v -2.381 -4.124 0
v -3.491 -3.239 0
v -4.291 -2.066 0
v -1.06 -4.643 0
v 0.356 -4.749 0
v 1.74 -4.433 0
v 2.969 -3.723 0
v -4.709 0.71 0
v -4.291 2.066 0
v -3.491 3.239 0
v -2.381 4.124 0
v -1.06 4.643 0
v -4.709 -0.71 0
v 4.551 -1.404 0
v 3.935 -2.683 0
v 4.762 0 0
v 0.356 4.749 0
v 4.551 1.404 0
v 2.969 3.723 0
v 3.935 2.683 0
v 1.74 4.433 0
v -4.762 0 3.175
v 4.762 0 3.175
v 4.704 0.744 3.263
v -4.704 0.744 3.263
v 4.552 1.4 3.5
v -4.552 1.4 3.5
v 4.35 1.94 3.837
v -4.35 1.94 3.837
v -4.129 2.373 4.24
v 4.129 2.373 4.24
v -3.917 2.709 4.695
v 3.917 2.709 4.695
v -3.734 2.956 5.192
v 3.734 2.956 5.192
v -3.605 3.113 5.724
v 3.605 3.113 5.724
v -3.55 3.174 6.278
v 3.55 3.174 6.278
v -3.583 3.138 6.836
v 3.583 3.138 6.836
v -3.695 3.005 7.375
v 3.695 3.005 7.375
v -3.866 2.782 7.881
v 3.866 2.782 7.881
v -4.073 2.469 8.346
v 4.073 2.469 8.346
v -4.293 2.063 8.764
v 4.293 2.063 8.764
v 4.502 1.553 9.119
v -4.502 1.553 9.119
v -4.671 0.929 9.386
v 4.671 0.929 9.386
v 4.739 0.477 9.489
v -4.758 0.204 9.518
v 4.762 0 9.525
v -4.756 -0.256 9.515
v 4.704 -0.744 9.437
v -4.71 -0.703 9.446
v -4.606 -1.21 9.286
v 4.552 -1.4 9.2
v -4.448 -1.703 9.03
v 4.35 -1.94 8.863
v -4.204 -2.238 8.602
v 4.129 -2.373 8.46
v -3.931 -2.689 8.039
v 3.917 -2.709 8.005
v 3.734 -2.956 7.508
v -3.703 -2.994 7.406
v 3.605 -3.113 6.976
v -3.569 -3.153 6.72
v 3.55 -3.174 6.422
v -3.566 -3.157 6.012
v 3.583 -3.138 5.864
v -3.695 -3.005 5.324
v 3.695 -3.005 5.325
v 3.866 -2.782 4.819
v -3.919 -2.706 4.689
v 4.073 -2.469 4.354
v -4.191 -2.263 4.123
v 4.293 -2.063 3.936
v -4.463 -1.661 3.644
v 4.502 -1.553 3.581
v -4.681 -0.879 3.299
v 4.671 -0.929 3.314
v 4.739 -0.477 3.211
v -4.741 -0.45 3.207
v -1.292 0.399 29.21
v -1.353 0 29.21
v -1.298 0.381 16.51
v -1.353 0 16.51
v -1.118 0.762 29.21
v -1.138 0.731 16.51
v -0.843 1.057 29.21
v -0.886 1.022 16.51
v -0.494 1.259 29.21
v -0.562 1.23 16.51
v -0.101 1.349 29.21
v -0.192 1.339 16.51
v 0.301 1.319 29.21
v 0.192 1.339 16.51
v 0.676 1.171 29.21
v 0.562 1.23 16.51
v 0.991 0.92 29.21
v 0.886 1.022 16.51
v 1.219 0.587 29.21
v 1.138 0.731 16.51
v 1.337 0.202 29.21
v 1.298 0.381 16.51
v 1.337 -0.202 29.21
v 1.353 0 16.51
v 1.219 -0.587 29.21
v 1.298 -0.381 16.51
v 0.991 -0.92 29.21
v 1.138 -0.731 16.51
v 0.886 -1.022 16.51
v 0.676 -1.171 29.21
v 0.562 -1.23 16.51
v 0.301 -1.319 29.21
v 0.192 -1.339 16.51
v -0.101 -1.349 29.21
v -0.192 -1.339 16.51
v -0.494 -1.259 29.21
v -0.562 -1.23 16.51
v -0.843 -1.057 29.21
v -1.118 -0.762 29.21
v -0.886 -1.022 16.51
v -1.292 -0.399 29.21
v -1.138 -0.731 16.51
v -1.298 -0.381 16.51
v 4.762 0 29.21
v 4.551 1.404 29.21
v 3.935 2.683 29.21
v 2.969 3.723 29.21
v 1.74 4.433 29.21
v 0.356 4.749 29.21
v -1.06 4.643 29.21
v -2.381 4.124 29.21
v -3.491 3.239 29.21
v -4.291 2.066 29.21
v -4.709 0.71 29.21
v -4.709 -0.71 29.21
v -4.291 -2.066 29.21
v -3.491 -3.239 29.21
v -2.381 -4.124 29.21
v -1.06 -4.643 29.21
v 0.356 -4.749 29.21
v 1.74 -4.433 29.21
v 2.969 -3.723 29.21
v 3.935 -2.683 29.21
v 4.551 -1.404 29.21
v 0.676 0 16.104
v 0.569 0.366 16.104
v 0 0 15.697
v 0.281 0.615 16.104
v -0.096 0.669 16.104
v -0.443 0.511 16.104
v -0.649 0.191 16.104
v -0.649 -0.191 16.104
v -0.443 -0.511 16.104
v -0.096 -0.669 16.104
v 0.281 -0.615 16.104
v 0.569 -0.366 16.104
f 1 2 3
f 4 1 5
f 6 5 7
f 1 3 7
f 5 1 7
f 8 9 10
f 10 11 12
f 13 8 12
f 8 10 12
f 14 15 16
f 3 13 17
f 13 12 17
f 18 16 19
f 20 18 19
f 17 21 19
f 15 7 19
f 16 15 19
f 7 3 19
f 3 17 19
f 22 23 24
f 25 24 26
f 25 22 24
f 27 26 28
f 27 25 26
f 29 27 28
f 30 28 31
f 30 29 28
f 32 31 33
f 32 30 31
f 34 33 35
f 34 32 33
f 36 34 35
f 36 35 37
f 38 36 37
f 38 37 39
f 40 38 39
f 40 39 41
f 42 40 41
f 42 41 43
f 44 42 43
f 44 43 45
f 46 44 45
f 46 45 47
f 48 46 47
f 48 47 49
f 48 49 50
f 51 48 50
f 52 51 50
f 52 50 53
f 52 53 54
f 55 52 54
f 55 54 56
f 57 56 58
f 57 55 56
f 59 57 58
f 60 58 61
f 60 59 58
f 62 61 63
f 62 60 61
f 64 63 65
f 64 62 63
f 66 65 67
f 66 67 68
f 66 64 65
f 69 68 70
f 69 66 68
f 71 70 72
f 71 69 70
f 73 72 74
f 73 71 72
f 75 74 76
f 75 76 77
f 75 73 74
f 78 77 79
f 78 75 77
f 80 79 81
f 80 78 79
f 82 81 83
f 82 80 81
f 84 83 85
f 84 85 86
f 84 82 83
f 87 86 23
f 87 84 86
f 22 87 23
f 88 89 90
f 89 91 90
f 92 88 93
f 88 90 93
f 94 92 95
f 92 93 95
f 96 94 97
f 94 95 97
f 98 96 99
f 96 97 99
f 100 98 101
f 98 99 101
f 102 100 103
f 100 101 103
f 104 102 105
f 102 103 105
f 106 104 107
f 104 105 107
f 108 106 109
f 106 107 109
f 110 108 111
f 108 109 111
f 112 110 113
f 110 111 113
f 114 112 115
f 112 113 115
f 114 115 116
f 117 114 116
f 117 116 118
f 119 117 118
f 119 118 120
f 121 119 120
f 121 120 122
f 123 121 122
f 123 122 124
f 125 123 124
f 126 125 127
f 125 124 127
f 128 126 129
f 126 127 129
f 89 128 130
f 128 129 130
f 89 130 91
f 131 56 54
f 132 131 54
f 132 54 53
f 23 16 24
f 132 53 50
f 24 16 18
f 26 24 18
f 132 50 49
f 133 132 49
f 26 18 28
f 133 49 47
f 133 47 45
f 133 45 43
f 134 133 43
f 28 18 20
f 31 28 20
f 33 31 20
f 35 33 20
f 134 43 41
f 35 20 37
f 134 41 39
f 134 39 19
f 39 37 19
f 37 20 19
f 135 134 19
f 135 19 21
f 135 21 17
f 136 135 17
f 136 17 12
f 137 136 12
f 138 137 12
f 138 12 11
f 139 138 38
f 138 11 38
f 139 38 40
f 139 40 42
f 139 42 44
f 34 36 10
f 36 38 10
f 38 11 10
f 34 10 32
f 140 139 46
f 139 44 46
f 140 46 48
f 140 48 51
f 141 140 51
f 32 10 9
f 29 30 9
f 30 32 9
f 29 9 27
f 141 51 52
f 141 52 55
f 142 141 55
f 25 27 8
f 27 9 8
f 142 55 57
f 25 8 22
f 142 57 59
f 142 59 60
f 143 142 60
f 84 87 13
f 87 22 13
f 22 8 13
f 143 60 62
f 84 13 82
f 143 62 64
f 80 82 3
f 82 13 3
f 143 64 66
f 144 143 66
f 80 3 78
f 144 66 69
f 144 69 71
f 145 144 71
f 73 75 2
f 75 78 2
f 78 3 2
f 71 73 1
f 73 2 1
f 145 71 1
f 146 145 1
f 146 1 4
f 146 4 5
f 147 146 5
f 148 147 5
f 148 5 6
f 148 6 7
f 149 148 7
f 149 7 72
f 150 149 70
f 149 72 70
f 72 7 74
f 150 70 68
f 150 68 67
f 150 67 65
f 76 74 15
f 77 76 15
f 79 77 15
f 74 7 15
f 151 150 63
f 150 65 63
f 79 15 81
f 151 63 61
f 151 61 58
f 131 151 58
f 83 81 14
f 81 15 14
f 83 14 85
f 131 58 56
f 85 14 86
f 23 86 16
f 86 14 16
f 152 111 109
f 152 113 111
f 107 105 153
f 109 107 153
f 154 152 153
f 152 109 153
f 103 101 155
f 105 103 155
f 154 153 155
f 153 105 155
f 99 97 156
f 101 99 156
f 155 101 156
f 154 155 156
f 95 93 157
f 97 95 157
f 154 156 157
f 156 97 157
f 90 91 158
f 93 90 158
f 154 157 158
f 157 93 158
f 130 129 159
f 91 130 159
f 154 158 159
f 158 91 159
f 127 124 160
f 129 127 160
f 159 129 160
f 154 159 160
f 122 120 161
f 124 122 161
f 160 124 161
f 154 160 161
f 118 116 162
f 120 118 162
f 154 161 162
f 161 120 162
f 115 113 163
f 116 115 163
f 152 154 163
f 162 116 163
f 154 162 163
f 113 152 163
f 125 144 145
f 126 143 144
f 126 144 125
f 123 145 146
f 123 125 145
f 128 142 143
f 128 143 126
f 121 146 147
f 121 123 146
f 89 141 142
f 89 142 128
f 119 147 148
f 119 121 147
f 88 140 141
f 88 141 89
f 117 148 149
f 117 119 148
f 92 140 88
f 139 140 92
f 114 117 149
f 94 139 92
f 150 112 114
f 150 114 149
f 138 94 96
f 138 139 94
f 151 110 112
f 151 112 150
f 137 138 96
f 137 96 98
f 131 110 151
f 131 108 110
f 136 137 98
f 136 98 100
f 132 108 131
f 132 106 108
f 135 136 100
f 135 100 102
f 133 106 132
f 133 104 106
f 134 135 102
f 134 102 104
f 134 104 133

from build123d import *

# Parameters (mm, degrees)
SKETCH1_R                 = 4.7625
BOSS_EXTRUDE1_DEPTH       = 29.21
CUT_EXTRUDE2_DEPTH        = 30.97643929
CUT_EXTRUDE2_DEPTH_BACK   = 30.97643929
SKETCH3_R                 = 3.175
F_6_32_TAPPED_HOLE1_D     = 2.7051
F_6_32_TAPPED_HOLE1_DEPTH = 12.7
F_6_32_TAPPED_HOLE1_TIP   = 0.81269403


with BuildPart() as part:
    # Sketch1 → Boss-Extrude1 (new body)
    with BuildSketch(Plane.XY):
        Circle(SKETCH1_R)
    extrude(amount=BOSS_EXTRUDE1_DEPTH)

    # Sketch3 → Cut-Extrude2 (cut, two sides: drawn at the far end of the back side and taken through both)
    with BuildSketch(Plane(origin=(0, 0, 0), x_dir=(0, 0, -1), z_dir=(1, 0, 0)).offset(-CUT_EXTRUDE2_DEPTH_BACK)):
        with Locations((-6.35, 0)):
            Circle(SKETCH3_R)
    extrude(amount=CUT_EXTRUDE2_DEPTH + CUT_EXTRUDE2_DEPTH_BACK, mode=Mode.SUBTRACT)

    # #6-32 Tapped Hole1
    with Locations(Plane.XY.offset(29.21)):
        with Locations((0, 0)):
            Hole(F_6_32_TAPPED_HOLE1_D / 2, depth=F_6_32_TAPPED_HOLE1_DEPTH)
            with Locations((0, 0, -(F_6_32_TAPPED_HOLE1_DEPTH + F_6_32_TAPPED_HOLE1_TIP / 2))):  # 118° drill point
                Cone(0, F_6_32_TAPPED_HOLE1_D / 2, F_6_32_TAPPED_HOLE1_TIP, mode=Mode.SUBTRACT)


solid = part.part
